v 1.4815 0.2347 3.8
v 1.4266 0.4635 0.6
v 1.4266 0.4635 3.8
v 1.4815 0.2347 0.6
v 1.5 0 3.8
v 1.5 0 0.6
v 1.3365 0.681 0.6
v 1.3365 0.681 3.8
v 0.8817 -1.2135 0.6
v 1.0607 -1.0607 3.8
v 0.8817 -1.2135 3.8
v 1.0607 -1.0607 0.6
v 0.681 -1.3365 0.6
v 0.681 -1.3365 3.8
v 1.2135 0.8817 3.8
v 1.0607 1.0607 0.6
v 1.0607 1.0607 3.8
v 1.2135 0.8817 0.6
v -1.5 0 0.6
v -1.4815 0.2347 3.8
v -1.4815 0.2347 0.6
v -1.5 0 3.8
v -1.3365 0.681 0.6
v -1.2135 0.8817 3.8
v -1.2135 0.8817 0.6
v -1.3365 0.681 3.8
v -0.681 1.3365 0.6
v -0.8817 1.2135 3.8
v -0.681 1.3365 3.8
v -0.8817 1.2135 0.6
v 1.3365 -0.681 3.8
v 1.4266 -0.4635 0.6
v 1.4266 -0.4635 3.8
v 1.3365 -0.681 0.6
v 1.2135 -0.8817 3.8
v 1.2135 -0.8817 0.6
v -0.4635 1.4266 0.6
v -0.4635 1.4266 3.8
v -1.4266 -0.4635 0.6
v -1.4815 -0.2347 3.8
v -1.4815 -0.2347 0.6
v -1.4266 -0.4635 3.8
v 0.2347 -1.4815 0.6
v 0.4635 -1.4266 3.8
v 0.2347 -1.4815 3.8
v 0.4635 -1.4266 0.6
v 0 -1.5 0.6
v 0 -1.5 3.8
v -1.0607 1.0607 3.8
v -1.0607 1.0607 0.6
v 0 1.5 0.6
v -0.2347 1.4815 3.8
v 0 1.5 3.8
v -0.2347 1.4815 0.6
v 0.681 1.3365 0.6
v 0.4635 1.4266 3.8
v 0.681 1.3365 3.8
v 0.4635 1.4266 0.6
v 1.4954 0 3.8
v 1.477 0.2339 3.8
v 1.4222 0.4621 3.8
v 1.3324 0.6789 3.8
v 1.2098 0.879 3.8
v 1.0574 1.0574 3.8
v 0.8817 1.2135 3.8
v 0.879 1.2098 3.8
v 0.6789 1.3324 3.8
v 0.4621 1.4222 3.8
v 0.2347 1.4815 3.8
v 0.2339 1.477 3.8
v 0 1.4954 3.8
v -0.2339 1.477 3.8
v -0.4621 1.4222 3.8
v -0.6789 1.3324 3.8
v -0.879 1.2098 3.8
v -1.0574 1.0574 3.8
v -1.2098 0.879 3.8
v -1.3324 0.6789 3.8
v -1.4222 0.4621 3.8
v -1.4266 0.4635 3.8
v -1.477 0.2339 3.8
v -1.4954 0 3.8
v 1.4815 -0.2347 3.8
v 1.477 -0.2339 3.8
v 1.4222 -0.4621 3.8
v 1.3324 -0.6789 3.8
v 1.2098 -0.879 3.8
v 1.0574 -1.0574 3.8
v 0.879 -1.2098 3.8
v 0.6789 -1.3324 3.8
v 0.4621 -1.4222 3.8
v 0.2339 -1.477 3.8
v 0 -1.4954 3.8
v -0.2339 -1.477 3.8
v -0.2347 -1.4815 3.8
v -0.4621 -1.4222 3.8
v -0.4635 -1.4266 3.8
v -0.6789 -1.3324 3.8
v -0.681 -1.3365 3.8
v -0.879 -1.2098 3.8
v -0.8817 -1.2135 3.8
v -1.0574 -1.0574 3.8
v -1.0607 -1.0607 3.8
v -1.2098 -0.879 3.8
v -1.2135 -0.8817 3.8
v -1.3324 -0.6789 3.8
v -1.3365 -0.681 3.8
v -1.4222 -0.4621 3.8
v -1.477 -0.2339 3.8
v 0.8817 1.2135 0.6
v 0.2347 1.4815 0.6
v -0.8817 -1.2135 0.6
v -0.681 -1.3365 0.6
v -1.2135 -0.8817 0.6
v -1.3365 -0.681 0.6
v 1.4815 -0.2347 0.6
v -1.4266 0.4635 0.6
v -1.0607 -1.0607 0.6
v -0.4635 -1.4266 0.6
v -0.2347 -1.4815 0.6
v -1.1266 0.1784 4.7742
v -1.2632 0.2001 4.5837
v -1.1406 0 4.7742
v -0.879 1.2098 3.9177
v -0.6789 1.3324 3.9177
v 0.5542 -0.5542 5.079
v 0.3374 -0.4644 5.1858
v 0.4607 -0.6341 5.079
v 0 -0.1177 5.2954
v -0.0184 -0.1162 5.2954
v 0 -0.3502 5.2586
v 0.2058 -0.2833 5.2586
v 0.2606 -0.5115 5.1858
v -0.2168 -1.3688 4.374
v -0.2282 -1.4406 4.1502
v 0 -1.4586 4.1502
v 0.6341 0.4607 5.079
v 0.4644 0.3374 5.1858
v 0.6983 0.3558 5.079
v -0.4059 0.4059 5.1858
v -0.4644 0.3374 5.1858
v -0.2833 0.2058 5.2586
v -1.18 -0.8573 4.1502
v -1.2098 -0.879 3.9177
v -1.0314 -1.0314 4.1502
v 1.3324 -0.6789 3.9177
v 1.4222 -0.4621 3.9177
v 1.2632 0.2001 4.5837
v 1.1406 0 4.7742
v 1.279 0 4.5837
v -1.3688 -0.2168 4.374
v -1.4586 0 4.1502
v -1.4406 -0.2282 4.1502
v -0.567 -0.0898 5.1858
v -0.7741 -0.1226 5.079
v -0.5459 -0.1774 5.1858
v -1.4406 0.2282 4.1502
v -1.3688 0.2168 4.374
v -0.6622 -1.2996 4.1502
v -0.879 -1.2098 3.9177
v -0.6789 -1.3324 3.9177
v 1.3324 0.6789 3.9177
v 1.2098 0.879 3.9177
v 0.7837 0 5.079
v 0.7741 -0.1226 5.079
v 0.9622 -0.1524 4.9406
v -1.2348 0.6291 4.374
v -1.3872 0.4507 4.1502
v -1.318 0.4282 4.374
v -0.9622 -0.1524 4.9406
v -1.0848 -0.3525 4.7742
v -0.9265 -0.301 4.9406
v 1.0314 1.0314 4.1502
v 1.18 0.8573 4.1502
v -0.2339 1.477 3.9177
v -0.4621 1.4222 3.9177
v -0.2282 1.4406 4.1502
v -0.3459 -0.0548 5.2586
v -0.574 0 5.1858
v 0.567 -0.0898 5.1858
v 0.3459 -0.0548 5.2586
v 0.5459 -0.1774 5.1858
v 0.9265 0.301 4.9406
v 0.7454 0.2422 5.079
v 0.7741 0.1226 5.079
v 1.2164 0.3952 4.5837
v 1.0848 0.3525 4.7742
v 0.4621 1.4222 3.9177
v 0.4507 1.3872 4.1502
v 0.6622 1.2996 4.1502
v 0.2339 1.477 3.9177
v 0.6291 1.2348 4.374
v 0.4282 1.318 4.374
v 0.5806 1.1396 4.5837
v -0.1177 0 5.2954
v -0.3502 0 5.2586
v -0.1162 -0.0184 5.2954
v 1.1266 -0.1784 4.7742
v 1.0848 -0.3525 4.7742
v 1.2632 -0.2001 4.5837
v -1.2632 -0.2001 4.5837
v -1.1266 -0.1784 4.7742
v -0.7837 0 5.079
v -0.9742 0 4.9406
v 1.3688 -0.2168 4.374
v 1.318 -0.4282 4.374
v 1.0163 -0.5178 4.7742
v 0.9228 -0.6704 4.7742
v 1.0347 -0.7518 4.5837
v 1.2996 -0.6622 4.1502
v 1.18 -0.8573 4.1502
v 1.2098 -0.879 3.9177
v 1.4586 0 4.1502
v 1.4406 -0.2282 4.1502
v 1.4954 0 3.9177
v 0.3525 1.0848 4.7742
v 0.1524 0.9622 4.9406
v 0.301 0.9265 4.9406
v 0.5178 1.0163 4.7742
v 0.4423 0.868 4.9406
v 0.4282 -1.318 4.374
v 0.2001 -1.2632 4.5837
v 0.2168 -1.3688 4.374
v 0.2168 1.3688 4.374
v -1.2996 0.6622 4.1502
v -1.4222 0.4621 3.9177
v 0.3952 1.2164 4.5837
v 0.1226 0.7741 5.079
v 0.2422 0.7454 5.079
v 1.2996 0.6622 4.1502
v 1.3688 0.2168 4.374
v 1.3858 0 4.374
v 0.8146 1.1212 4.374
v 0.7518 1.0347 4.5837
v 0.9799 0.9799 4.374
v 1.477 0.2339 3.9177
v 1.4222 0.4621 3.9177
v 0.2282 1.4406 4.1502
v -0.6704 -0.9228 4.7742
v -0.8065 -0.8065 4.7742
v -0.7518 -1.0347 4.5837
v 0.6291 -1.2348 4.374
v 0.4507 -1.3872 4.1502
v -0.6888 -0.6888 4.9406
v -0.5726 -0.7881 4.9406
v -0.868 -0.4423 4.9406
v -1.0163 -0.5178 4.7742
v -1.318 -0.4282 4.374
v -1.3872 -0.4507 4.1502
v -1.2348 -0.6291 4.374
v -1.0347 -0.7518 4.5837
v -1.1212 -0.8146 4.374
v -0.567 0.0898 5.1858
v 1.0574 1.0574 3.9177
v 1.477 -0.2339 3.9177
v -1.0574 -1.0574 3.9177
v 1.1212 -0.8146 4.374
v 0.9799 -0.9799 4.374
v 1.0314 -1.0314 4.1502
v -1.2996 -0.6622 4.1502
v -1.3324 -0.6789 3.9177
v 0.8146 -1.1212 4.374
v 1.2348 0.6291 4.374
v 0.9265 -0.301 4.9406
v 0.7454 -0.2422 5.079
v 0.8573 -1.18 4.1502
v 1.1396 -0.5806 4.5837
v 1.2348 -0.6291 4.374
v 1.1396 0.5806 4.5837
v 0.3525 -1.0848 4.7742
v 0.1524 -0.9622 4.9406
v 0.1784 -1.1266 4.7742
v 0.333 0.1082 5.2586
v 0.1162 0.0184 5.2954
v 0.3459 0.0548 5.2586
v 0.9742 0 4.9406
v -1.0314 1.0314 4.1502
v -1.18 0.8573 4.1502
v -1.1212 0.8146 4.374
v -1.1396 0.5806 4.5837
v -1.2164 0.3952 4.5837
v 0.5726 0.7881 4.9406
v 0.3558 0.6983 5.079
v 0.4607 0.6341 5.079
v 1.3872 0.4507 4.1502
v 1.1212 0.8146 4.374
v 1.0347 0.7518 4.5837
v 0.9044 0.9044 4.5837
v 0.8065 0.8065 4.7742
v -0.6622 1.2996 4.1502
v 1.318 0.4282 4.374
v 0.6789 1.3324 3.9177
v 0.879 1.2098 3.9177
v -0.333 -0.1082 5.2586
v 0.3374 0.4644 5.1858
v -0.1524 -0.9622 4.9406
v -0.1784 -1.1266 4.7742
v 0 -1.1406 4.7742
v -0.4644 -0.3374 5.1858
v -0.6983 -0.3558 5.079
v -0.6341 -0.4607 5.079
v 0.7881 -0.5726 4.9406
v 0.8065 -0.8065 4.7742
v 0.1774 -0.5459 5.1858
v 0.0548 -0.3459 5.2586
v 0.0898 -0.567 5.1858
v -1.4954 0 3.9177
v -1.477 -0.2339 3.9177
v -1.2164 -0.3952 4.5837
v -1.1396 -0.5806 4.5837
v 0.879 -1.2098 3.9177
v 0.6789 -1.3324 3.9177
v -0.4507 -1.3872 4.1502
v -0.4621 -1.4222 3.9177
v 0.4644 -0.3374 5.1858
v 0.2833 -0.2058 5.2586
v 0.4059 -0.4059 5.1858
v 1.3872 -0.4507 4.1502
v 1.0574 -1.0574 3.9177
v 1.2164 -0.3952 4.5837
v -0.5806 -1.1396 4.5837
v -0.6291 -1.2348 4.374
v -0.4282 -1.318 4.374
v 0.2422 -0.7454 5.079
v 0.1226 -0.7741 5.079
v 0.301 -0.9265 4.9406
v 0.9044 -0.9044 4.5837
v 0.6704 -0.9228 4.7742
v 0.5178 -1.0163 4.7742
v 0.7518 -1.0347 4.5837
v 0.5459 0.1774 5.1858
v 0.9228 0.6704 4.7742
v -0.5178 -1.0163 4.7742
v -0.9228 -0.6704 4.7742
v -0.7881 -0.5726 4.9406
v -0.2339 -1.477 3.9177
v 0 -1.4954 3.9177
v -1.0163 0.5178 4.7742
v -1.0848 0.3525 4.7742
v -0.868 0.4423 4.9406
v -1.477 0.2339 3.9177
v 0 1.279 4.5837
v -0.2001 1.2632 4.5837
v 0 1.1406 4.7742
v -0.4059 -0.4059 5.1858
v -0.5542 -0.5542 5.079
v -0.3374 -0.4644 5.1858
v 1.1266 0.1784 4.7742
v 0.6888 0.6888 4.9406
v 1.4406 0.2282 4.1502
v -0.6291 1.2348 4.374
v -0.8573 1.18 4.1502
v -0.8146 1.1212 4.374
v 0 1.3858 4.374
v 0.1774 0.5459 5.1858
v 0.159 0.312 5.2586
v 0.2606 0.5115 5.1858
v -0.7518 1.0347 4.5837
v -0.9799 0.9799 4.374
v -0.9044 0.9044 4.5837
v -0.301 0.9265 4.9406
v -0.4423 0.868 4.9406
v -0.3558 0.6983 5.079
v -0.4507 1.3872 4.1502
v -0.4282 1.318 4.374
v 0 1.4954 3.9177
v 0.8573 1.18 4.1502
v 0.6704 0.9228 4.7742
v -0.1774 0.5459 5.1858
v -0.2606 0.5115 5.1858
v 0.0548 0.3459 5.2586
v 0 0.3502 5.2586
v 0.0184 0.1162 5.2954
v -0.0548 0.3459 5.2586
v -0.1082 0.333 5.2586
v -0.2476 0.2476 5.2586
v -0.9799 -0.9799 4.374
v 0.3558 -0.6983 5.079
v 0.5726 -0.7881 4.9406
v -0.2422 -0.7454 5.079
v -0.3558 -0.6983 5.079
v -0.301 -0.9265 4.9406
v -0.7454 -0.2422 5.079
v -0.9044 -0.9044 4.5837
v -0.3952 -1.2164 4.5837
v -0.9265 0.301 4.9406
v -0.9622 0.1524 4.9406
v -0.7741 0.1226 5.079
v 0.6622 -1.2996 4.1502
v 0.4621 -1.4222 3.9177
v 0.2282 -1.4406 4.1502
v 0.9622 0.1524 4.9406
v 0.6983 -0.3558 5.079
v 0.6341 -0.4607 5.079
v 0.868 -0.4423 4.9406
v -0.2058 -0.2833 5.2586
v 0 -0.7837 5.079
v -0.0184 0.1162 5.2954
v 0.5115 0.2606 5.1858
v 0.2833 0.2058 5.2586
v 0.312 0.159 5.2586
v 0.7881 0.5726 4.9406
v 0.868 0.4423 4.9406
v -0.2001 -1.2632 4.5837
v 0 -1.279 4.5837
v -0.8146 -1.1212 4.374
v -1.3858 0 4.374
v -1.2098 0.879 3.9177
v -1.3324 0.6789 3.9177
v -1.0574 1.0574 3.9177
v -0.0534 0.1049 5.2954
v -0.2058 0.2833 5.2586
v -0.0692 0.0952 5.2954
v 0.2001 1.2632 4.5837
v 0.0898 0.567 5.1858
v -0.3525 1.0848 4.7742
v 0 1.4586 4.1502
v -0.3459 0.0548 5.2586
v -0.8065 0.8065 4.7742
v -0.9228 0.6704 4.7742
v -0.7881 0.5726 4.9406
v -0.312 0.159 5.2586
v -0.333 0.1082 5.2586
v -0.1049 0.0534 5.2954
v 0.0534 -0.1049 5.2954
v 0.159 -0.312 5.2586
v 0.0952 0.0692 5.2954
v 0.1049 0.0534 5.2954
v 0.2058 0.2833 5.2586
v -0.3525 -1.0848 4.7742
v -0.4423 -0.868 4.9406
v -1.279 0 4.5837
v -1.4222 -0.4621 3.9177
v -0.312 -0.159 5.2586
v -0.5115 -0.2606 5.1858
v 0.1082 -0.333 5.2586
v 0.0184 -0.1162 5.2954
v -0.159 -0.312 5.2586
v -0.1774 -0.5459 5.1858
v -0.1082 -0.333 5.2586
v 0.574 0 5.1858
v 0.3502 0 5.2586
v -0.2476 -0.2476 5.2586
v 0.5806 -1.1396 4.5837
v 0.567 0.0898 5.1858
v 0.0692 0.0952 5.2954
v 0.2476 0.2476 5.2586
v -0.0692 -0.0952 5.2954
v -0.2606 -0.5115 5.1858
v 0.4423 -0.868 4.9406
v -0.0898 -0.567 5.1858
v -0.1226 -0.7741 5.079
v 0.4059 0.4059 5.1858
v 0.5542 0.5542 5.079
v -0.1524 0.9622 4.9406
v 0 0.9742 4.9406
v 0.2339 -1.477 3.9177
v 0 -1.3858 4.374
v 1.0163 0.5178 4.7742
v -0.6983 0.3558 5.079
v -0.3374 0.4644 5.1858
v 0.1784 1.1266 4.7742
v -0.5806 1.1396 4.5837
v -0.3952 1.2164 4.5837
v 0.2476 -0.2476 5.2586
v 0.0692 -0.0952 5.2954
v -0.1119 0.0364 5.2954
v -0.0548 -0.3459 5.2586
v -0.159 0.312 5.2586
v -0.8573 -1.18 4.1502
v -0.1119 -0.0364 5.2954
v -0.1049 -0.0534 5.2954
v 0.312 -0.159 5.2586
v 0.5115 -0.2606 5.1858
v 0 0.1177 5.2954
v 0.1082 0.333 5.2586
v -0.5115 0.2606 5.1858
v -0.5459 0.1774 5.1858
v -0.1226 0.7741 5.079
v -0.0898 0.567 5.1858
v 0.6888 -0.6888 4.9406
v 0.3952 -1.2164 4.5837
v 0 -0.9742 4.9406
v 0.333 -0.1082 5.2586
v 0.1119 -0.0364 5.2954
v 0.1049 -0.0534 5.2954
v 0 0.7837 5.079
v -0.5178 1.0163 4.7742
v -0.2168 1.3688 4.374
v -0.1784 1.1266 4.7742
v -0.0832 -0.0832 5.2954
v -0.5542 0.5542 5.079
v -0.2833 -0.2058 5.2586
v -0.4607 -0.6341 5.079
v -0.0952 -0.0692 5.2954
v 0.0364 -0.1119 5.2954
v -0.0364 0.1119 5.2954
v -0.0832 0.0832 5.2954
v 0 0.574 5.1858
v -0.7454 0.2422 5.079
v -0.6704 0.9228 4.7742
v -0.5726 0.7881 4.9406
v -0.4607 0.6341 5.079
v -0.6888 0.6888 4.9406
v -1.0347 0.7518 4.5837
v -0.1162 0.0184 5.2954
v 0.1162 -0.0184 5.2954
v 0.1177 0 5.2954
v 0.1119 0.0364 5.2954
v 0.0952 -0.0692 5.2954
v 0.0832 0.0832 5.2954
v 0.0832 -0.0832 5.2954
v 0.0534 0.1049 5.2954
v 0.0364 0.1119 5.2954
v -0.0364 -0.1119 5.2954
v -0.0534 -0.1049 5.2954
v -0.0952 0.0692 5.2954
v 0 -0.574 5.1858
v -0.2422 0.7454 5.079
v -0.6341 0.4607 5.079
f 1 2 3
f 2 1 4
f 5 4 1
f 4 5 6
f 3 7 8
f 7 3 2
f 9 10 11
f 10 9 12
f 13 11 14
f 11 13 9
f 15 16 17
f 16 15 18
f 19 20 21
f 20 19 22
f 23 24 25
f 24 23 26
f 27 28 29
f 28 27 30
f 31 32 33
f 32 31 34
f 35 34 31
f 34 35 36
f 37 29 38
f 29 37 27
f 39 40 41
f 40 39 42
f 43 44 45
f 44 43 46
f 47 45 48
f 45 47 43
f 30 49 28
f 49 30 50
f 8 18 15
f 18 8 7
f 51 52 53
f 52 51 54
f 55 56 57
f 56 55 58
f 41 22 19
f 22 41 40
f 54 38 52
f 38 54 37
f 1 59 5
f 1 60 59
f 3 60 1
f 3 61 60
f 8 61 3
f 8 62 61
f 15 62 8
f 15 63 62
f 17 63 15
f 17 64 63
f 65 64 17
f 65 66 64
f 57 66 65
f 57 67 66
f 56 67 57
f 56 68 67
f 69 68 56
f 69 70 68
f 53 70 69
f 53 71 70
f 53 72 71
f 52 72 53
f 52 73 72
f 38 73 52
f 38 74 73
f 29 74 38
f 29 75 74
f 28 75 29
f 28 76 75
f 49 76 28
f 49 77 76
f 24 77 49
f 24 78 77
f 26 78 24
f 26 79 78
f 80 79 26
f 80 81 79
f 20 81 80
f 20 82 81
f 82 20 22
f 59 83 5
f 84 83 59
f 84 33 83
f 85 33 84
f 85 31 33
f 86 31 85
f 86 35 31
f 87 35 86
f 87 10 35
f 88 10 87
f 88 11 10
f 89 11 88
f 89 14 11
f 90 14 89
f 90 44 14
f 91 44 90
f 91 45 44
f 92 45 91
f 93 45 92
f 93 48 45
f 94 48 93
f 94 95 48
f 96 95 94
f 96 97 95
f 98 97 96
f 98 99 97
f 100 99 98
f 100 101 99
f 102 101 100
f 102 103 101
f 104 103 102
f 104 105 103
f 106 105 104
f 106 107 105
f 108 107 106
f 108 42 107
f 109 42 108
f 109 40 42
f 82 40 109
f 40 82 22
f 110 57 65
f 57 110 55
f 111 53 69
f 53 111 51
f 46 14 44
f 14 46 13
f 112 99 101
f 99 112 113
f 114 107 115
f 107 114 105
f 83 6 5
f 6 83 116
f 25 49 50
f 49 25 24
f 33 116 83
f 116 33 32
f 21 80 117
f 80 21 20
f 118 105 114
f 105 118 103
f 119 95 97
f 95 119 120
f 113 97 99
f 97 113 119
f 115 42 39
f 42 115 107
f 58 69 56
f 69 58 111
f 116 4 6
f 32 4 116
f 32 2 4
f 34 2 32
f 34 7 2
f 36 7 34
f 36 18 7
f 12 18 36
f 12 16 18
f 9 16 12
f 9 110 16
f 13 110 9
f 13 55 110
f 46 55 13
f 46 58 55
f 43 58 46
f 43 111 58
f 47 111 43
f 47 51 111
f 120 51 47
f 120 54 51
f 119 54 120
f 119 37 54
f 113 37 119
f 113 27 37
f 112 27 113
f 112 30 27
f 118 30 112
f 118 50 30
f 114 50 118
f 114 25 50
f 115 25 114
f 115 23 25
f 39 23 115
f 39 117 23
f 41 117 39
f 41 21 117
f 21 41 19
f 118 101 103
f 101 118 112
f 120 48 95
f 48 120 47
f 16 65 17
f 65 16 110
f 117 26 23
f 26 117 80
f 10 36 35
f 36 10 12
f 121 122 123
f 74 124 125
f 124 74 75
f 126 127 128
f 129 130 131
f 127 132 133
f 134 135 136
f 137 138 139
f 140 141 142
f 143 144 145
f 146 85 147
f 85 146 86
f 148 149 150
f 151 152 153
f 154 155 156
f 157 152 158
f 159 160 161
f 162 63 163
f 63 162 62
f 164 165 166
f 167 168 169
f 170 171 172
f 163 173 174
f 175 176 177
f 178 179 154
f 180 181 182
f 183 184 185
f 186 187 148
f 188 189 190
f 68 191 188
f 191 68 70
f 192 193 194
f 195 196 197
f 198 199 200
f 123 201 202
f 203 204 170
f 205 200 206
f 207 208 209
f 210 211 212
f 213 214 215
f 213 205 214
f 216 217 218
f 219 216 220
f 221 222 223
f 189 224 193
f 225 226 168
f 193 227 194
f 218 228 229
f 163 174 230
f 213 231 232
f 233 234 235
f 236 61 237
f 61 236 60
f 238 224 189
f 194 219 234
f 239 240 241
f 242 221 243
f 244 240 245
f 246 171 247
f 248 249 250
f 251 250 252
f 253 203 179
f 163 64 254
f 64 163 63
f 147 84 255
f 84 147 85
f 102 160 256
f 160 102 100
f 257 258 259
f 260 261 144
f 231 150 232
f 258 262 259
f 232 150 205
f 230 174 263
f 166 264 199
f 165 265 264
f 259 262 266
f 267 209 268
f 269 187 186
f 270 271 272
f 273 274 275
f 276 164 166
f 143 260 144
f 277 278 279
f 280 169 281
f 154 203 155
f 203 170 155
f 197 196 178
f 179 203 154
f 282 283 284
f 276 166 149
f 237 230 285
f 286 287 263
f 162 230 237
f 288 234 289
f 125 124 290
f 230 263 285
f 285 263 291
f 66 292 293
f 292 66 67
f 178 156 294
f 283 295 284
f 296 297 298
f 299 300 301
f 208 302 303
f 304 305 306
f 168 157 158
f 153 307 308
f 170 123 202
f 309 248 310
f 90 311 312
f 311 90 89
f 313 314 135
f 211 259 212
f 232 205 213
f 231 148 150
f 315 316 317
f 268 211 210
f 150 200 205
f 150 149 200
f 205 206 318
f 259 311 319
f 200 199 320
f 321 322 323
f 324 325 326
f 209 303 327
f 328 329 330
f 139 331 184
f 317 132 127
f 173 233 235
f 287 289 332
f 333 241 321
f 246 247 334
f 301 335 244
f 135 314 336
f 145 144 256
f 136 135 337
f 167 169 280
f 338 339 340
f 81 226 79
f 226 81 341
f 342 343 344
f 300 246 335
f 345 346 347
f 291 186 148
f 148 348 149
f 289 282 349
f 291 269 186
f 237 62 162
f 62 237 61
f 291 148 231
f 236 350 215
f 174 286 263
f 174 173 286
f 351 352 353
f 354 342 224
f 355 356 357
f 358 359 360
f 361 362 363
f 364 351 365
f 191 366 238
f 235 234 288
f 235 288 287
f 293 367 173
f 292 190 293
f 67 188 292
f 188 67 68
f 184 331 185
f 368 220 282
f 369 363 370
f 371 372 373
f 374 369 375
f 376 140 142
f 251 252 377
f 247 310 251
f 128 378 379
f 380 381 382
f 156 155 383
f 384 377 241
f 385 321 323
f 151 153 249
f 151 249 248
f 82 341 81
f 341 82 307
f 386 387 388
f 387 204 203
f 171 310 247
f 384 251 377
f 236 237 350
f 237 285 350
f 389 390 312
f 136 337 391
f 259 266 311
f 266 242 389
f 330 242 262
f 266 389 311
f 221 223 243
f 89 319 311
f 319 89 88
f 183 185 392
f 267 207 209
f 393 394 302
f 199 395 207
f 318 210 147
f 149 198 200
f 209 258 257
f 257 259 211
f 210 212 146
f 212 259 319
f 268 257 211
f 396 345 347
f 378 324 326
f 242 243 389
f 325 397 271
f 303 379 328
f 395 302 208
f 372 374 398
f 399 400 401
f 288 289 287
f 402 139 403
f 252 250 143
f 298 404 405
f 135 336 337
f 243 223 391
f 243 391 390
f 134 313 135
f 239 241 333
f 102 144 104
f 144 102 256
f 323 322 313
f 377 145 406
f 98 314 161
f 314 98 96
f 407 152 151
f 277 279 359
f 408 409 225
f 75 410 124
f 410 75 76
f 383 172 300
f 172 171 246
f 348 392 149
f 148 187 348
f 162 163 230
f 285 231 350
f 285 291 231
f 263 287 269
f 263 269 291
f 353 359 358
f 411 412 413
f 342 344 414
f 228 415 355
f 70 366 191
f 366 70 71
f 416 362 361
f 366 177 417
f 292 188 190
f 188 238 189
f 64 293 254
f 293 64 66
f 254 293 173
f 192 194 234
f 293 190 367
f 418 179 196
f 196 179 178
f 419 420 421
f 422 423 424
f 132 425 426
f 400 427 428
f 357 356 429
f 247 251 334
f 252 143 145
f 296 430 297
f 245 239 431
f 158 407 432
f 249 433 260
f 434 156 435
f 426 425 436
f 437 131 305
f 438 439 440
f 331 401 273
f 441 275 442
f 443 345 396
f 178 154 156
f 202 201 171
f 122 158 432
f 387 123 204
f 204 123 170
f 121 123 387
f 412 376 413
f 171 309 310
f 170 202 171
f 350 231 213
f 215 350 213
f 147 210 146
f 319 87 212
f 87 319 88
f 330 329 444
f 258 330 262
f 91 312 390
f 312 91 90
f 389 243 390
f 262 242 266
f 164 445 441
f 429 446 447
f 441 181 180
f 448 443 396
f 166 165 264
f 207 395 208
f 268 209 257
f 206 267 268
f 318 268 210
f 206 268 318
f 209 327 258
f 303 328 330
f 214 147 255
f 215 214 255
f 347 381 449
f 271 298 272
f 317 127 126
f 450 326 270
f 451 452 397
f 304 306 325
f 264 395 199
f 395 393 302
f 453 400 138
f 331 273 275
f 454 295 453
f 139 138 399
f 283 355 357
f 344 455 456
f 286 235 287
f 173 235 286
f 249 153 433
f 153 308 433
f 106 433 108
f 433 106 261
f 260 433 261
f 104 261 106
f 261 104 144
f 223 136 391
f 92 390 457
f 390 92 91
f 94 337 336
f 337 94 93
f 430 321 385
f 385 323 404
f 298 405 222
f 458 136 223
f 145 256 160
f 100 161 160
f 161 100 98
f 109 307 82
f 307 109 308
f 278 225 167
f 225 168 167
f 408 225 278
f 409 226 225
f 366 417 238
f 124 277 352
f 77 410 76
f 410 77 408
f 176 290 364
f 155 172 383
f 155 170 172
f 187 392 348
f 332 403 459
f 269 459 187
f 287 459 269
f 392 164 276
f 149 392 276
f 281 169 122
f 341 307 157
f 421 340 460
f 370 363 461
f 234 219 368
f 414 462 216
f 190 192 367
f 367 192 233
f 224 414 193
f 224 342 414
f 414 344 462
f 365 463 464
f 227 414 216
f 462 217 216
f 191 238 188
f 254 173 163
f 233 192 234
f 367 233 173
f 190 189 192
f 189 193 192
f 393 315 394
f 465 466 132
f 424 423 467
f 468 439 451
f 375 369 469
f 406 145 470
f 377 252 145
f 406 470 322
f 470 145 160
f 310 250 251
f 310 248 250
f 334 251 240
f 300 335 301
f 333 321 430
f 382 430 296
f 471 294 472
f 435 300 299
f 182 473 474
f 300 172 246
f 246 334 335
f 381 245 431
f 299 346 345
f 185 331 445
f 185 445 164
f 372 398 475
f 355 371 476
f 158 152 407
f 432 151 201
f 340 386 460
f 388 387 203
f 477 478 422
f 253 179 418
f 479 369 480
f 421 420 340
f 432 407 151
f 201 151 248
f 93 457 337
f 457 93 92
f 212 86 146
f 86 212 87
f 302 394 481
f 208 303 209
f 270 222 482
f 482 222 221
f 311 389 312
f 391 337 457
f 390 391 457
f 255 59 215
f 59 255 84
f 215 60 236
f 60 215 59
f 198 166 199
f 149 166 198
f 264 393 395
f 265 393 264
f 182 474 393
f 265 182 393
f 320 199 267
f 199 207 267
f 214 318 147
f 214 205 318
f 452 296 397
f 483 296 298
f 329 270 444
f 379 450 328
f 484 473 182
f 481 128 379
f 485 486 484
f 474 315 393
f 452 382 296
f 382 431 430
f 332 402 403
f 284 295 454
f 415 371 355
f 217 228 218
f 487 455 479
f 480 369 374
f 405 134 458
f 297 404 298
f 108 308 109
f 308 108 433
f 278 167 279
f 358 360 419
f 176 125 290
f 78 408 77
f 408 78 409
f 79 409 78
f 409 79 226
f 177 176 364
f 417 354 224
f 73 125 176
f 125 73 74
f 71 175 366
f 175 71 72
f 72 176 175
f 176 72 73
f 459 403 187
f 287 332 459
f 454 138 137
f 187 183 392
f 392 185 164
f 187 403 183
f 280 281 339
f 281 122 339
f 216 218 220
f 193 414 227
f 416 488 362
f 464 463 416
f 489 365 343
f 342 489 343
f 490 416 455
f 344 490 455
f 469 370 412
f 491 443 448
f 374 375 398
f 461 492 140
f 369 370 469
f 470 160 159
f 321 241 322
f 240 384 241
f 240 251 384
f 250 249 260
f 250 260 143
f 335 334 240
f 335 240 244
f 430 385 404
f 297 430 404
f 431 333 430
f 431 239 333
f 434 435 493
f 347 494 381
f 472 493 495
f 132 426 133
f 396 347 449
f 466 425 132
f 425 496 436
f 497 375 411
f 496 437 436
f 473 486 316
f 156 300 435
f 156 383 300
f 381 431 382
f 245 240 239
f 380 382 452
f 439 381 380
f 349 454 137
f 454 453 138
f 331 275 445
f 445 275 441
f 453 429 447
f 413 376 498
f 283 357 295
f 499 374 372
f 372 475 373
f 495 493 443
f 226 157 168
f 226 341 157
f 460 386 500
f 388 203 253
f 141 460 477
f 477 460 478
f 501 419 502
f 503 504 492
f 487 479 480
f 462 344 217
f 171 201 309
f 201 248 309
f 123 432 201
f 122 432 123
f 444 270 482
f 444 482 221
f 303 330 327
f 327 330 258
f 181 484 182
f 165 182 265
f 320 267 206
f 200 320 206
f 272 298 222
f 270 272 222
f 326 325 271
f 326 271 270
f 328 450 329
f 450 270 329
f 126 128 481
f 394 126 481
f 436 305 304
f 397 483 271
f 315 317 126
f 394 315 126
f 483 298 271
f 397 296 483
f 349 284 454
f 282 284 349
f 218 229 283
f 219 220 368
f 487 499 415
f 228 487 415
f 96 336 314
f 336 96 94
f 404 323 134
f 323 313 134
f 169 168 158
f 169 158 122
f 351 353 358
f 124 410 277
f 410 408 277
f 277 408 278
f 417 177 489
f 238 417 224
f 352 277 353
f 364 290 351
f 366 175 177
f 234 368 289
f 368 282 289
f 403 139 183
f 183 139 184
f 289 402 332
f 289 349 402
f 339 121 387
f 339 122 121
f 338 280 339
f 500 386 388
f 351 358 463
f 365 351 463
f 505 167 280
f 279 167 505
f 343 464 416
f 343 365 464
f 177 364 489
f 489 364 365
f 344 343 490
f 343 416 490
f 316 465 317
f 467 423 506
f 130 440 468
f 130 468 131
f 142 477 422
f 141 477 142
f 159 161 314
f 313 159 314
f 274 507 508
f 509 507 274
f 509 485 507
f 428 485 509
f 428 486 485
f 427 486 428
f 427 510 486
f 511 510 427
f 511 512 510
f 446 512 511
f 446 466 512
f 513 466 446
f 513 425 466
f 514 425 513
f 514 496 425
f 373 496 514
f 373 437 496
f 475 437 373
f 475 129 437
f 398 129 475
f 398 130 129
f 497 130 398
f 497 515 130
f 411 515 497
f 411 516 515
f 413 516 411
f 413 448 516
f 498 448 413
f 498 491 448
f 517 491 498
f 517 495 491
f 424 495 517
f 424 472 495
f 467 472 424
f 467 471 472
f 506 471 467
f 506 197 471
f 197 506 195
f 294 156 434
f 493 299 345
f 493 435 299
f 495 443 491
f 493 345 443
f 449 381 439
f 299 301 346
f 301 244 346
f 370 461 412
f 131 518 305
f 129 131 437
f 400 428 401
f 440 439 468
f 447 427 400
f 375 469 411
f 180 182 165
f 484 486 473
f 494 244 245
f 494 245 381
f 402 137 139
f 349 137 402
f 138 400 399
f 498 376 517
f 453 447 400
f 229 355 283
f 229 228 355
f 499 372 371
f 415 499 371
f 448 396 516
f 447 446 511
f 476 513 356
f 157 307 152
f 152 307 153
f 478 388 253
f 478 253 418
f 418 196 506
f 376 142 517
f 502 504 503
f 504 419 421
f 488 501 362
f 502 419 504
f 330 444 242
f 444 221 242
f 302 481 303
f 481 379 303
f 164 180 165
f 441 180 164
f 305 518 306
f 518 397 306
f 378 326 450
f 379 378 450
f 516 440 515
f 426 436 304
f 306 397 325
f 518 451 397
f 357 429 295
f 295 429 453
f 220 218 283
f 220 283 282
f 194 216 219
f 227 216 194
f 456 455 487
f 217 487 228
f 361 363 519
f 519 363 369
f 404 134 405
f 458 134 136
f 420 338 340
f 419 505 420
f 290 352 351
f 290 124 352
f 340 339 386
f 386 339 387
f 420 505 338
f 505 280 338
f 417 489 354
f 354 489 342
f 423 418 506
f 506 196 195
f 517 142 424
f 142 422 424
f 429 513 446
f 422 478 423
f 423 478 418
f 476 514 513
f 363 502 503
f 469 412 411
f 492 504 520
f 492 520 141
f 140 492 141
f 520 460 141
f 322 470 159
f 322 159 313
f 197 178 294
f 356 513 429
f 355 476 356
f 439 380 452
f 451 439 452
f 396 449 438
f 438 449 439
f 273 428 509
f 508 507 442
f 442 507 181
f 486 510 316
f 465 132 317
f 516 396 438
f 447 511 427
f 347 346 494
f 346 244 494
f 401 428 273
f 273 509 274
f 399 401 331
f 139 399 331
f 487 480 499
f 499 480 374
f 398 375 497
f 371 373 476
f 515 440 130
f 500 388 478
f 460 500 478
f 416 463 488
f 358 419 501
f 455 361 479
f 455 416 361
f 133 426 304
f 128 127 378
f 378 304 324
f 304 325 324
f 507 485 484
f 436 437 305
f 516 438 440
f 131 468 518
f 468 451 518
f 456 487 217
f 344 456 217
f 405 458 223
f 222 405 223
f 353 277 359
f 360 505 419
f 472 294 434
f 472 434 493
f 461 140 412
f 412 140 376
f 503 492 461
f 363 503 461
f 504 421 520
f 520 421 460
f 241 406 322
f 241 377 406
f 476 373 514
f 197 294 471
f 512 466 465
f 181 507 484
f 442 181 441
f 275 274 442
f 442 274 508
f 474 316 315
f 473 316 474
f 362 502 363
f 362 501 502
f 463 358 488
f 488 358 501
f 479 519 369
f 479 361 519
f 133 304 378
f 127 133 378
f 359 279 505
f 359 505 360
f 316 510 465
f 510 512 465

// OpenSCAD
// 3 mm through-hole LED standing on the board face (TS06_LED_D3.0mm: HL1..HL9). Made for 3d/populated.
//
// layers: lens=#f2a31c flange=#d98a10 leads=#c9c9c9
//
// FRAME  KiCad model frame. Pad 1 (cathode, square) at (-1.27, 0), pad 2 (anode) at (1.27, 0).
//
// DIMENSIONS                         value        kind
//   body D          3.0 mm                         MEASURED (repo source): footprint name and descr (KiCad LED_D3.0mm)
//   overall height  5.3 mm above the board face    MEASURED (repo source): footprint descr "a 5.3 mm-tall body"; also
//                                                  case_pair.py LED_H (marked assumed there)
//   flange          D3.8 x 0.6 mm, flat on the cathode side   INFERRED (case_pair.py LED_FLANGE_D 3.8, assumed)
//   leads           D0.5, 1.5 mm proud of the back face       INFERRED (case_pair.py PIN_TAIL 1.5, assumed)
// Amber, opaque: a clear 3 mm lens is drawn as a solid.
L = "lens";
H = 5.3;
FL_D = 3.8;
FL_T = 0.6;
BODY_D = 3.0;
R = BODY_D / 2;

if (L == "lens") {
    translate([0, 0, FL_T]) cylinder(d = BODY_D, h = H - R - FL_T, $fn = 40);
    translate([0, 0, H - R]) sphere(r = R, $fn = 40);
}
if (L == "flange") {
    intersection() {
        cylinder(d = FL_D, h = FL_T, $fn = 40);
        translate([-1.45, -3, -1]) cube([6, 6, 3]);          // the flat, on the cathode side (-x)
    }
}
if (L == "leads") {
    for (x = [-1.27, 1.27]) translate([x, 0, -1.6 - 1.5]) cylinder(d = 0.5, h = 1.6 + 1.5 + 0.3, $fn = 10);
}
